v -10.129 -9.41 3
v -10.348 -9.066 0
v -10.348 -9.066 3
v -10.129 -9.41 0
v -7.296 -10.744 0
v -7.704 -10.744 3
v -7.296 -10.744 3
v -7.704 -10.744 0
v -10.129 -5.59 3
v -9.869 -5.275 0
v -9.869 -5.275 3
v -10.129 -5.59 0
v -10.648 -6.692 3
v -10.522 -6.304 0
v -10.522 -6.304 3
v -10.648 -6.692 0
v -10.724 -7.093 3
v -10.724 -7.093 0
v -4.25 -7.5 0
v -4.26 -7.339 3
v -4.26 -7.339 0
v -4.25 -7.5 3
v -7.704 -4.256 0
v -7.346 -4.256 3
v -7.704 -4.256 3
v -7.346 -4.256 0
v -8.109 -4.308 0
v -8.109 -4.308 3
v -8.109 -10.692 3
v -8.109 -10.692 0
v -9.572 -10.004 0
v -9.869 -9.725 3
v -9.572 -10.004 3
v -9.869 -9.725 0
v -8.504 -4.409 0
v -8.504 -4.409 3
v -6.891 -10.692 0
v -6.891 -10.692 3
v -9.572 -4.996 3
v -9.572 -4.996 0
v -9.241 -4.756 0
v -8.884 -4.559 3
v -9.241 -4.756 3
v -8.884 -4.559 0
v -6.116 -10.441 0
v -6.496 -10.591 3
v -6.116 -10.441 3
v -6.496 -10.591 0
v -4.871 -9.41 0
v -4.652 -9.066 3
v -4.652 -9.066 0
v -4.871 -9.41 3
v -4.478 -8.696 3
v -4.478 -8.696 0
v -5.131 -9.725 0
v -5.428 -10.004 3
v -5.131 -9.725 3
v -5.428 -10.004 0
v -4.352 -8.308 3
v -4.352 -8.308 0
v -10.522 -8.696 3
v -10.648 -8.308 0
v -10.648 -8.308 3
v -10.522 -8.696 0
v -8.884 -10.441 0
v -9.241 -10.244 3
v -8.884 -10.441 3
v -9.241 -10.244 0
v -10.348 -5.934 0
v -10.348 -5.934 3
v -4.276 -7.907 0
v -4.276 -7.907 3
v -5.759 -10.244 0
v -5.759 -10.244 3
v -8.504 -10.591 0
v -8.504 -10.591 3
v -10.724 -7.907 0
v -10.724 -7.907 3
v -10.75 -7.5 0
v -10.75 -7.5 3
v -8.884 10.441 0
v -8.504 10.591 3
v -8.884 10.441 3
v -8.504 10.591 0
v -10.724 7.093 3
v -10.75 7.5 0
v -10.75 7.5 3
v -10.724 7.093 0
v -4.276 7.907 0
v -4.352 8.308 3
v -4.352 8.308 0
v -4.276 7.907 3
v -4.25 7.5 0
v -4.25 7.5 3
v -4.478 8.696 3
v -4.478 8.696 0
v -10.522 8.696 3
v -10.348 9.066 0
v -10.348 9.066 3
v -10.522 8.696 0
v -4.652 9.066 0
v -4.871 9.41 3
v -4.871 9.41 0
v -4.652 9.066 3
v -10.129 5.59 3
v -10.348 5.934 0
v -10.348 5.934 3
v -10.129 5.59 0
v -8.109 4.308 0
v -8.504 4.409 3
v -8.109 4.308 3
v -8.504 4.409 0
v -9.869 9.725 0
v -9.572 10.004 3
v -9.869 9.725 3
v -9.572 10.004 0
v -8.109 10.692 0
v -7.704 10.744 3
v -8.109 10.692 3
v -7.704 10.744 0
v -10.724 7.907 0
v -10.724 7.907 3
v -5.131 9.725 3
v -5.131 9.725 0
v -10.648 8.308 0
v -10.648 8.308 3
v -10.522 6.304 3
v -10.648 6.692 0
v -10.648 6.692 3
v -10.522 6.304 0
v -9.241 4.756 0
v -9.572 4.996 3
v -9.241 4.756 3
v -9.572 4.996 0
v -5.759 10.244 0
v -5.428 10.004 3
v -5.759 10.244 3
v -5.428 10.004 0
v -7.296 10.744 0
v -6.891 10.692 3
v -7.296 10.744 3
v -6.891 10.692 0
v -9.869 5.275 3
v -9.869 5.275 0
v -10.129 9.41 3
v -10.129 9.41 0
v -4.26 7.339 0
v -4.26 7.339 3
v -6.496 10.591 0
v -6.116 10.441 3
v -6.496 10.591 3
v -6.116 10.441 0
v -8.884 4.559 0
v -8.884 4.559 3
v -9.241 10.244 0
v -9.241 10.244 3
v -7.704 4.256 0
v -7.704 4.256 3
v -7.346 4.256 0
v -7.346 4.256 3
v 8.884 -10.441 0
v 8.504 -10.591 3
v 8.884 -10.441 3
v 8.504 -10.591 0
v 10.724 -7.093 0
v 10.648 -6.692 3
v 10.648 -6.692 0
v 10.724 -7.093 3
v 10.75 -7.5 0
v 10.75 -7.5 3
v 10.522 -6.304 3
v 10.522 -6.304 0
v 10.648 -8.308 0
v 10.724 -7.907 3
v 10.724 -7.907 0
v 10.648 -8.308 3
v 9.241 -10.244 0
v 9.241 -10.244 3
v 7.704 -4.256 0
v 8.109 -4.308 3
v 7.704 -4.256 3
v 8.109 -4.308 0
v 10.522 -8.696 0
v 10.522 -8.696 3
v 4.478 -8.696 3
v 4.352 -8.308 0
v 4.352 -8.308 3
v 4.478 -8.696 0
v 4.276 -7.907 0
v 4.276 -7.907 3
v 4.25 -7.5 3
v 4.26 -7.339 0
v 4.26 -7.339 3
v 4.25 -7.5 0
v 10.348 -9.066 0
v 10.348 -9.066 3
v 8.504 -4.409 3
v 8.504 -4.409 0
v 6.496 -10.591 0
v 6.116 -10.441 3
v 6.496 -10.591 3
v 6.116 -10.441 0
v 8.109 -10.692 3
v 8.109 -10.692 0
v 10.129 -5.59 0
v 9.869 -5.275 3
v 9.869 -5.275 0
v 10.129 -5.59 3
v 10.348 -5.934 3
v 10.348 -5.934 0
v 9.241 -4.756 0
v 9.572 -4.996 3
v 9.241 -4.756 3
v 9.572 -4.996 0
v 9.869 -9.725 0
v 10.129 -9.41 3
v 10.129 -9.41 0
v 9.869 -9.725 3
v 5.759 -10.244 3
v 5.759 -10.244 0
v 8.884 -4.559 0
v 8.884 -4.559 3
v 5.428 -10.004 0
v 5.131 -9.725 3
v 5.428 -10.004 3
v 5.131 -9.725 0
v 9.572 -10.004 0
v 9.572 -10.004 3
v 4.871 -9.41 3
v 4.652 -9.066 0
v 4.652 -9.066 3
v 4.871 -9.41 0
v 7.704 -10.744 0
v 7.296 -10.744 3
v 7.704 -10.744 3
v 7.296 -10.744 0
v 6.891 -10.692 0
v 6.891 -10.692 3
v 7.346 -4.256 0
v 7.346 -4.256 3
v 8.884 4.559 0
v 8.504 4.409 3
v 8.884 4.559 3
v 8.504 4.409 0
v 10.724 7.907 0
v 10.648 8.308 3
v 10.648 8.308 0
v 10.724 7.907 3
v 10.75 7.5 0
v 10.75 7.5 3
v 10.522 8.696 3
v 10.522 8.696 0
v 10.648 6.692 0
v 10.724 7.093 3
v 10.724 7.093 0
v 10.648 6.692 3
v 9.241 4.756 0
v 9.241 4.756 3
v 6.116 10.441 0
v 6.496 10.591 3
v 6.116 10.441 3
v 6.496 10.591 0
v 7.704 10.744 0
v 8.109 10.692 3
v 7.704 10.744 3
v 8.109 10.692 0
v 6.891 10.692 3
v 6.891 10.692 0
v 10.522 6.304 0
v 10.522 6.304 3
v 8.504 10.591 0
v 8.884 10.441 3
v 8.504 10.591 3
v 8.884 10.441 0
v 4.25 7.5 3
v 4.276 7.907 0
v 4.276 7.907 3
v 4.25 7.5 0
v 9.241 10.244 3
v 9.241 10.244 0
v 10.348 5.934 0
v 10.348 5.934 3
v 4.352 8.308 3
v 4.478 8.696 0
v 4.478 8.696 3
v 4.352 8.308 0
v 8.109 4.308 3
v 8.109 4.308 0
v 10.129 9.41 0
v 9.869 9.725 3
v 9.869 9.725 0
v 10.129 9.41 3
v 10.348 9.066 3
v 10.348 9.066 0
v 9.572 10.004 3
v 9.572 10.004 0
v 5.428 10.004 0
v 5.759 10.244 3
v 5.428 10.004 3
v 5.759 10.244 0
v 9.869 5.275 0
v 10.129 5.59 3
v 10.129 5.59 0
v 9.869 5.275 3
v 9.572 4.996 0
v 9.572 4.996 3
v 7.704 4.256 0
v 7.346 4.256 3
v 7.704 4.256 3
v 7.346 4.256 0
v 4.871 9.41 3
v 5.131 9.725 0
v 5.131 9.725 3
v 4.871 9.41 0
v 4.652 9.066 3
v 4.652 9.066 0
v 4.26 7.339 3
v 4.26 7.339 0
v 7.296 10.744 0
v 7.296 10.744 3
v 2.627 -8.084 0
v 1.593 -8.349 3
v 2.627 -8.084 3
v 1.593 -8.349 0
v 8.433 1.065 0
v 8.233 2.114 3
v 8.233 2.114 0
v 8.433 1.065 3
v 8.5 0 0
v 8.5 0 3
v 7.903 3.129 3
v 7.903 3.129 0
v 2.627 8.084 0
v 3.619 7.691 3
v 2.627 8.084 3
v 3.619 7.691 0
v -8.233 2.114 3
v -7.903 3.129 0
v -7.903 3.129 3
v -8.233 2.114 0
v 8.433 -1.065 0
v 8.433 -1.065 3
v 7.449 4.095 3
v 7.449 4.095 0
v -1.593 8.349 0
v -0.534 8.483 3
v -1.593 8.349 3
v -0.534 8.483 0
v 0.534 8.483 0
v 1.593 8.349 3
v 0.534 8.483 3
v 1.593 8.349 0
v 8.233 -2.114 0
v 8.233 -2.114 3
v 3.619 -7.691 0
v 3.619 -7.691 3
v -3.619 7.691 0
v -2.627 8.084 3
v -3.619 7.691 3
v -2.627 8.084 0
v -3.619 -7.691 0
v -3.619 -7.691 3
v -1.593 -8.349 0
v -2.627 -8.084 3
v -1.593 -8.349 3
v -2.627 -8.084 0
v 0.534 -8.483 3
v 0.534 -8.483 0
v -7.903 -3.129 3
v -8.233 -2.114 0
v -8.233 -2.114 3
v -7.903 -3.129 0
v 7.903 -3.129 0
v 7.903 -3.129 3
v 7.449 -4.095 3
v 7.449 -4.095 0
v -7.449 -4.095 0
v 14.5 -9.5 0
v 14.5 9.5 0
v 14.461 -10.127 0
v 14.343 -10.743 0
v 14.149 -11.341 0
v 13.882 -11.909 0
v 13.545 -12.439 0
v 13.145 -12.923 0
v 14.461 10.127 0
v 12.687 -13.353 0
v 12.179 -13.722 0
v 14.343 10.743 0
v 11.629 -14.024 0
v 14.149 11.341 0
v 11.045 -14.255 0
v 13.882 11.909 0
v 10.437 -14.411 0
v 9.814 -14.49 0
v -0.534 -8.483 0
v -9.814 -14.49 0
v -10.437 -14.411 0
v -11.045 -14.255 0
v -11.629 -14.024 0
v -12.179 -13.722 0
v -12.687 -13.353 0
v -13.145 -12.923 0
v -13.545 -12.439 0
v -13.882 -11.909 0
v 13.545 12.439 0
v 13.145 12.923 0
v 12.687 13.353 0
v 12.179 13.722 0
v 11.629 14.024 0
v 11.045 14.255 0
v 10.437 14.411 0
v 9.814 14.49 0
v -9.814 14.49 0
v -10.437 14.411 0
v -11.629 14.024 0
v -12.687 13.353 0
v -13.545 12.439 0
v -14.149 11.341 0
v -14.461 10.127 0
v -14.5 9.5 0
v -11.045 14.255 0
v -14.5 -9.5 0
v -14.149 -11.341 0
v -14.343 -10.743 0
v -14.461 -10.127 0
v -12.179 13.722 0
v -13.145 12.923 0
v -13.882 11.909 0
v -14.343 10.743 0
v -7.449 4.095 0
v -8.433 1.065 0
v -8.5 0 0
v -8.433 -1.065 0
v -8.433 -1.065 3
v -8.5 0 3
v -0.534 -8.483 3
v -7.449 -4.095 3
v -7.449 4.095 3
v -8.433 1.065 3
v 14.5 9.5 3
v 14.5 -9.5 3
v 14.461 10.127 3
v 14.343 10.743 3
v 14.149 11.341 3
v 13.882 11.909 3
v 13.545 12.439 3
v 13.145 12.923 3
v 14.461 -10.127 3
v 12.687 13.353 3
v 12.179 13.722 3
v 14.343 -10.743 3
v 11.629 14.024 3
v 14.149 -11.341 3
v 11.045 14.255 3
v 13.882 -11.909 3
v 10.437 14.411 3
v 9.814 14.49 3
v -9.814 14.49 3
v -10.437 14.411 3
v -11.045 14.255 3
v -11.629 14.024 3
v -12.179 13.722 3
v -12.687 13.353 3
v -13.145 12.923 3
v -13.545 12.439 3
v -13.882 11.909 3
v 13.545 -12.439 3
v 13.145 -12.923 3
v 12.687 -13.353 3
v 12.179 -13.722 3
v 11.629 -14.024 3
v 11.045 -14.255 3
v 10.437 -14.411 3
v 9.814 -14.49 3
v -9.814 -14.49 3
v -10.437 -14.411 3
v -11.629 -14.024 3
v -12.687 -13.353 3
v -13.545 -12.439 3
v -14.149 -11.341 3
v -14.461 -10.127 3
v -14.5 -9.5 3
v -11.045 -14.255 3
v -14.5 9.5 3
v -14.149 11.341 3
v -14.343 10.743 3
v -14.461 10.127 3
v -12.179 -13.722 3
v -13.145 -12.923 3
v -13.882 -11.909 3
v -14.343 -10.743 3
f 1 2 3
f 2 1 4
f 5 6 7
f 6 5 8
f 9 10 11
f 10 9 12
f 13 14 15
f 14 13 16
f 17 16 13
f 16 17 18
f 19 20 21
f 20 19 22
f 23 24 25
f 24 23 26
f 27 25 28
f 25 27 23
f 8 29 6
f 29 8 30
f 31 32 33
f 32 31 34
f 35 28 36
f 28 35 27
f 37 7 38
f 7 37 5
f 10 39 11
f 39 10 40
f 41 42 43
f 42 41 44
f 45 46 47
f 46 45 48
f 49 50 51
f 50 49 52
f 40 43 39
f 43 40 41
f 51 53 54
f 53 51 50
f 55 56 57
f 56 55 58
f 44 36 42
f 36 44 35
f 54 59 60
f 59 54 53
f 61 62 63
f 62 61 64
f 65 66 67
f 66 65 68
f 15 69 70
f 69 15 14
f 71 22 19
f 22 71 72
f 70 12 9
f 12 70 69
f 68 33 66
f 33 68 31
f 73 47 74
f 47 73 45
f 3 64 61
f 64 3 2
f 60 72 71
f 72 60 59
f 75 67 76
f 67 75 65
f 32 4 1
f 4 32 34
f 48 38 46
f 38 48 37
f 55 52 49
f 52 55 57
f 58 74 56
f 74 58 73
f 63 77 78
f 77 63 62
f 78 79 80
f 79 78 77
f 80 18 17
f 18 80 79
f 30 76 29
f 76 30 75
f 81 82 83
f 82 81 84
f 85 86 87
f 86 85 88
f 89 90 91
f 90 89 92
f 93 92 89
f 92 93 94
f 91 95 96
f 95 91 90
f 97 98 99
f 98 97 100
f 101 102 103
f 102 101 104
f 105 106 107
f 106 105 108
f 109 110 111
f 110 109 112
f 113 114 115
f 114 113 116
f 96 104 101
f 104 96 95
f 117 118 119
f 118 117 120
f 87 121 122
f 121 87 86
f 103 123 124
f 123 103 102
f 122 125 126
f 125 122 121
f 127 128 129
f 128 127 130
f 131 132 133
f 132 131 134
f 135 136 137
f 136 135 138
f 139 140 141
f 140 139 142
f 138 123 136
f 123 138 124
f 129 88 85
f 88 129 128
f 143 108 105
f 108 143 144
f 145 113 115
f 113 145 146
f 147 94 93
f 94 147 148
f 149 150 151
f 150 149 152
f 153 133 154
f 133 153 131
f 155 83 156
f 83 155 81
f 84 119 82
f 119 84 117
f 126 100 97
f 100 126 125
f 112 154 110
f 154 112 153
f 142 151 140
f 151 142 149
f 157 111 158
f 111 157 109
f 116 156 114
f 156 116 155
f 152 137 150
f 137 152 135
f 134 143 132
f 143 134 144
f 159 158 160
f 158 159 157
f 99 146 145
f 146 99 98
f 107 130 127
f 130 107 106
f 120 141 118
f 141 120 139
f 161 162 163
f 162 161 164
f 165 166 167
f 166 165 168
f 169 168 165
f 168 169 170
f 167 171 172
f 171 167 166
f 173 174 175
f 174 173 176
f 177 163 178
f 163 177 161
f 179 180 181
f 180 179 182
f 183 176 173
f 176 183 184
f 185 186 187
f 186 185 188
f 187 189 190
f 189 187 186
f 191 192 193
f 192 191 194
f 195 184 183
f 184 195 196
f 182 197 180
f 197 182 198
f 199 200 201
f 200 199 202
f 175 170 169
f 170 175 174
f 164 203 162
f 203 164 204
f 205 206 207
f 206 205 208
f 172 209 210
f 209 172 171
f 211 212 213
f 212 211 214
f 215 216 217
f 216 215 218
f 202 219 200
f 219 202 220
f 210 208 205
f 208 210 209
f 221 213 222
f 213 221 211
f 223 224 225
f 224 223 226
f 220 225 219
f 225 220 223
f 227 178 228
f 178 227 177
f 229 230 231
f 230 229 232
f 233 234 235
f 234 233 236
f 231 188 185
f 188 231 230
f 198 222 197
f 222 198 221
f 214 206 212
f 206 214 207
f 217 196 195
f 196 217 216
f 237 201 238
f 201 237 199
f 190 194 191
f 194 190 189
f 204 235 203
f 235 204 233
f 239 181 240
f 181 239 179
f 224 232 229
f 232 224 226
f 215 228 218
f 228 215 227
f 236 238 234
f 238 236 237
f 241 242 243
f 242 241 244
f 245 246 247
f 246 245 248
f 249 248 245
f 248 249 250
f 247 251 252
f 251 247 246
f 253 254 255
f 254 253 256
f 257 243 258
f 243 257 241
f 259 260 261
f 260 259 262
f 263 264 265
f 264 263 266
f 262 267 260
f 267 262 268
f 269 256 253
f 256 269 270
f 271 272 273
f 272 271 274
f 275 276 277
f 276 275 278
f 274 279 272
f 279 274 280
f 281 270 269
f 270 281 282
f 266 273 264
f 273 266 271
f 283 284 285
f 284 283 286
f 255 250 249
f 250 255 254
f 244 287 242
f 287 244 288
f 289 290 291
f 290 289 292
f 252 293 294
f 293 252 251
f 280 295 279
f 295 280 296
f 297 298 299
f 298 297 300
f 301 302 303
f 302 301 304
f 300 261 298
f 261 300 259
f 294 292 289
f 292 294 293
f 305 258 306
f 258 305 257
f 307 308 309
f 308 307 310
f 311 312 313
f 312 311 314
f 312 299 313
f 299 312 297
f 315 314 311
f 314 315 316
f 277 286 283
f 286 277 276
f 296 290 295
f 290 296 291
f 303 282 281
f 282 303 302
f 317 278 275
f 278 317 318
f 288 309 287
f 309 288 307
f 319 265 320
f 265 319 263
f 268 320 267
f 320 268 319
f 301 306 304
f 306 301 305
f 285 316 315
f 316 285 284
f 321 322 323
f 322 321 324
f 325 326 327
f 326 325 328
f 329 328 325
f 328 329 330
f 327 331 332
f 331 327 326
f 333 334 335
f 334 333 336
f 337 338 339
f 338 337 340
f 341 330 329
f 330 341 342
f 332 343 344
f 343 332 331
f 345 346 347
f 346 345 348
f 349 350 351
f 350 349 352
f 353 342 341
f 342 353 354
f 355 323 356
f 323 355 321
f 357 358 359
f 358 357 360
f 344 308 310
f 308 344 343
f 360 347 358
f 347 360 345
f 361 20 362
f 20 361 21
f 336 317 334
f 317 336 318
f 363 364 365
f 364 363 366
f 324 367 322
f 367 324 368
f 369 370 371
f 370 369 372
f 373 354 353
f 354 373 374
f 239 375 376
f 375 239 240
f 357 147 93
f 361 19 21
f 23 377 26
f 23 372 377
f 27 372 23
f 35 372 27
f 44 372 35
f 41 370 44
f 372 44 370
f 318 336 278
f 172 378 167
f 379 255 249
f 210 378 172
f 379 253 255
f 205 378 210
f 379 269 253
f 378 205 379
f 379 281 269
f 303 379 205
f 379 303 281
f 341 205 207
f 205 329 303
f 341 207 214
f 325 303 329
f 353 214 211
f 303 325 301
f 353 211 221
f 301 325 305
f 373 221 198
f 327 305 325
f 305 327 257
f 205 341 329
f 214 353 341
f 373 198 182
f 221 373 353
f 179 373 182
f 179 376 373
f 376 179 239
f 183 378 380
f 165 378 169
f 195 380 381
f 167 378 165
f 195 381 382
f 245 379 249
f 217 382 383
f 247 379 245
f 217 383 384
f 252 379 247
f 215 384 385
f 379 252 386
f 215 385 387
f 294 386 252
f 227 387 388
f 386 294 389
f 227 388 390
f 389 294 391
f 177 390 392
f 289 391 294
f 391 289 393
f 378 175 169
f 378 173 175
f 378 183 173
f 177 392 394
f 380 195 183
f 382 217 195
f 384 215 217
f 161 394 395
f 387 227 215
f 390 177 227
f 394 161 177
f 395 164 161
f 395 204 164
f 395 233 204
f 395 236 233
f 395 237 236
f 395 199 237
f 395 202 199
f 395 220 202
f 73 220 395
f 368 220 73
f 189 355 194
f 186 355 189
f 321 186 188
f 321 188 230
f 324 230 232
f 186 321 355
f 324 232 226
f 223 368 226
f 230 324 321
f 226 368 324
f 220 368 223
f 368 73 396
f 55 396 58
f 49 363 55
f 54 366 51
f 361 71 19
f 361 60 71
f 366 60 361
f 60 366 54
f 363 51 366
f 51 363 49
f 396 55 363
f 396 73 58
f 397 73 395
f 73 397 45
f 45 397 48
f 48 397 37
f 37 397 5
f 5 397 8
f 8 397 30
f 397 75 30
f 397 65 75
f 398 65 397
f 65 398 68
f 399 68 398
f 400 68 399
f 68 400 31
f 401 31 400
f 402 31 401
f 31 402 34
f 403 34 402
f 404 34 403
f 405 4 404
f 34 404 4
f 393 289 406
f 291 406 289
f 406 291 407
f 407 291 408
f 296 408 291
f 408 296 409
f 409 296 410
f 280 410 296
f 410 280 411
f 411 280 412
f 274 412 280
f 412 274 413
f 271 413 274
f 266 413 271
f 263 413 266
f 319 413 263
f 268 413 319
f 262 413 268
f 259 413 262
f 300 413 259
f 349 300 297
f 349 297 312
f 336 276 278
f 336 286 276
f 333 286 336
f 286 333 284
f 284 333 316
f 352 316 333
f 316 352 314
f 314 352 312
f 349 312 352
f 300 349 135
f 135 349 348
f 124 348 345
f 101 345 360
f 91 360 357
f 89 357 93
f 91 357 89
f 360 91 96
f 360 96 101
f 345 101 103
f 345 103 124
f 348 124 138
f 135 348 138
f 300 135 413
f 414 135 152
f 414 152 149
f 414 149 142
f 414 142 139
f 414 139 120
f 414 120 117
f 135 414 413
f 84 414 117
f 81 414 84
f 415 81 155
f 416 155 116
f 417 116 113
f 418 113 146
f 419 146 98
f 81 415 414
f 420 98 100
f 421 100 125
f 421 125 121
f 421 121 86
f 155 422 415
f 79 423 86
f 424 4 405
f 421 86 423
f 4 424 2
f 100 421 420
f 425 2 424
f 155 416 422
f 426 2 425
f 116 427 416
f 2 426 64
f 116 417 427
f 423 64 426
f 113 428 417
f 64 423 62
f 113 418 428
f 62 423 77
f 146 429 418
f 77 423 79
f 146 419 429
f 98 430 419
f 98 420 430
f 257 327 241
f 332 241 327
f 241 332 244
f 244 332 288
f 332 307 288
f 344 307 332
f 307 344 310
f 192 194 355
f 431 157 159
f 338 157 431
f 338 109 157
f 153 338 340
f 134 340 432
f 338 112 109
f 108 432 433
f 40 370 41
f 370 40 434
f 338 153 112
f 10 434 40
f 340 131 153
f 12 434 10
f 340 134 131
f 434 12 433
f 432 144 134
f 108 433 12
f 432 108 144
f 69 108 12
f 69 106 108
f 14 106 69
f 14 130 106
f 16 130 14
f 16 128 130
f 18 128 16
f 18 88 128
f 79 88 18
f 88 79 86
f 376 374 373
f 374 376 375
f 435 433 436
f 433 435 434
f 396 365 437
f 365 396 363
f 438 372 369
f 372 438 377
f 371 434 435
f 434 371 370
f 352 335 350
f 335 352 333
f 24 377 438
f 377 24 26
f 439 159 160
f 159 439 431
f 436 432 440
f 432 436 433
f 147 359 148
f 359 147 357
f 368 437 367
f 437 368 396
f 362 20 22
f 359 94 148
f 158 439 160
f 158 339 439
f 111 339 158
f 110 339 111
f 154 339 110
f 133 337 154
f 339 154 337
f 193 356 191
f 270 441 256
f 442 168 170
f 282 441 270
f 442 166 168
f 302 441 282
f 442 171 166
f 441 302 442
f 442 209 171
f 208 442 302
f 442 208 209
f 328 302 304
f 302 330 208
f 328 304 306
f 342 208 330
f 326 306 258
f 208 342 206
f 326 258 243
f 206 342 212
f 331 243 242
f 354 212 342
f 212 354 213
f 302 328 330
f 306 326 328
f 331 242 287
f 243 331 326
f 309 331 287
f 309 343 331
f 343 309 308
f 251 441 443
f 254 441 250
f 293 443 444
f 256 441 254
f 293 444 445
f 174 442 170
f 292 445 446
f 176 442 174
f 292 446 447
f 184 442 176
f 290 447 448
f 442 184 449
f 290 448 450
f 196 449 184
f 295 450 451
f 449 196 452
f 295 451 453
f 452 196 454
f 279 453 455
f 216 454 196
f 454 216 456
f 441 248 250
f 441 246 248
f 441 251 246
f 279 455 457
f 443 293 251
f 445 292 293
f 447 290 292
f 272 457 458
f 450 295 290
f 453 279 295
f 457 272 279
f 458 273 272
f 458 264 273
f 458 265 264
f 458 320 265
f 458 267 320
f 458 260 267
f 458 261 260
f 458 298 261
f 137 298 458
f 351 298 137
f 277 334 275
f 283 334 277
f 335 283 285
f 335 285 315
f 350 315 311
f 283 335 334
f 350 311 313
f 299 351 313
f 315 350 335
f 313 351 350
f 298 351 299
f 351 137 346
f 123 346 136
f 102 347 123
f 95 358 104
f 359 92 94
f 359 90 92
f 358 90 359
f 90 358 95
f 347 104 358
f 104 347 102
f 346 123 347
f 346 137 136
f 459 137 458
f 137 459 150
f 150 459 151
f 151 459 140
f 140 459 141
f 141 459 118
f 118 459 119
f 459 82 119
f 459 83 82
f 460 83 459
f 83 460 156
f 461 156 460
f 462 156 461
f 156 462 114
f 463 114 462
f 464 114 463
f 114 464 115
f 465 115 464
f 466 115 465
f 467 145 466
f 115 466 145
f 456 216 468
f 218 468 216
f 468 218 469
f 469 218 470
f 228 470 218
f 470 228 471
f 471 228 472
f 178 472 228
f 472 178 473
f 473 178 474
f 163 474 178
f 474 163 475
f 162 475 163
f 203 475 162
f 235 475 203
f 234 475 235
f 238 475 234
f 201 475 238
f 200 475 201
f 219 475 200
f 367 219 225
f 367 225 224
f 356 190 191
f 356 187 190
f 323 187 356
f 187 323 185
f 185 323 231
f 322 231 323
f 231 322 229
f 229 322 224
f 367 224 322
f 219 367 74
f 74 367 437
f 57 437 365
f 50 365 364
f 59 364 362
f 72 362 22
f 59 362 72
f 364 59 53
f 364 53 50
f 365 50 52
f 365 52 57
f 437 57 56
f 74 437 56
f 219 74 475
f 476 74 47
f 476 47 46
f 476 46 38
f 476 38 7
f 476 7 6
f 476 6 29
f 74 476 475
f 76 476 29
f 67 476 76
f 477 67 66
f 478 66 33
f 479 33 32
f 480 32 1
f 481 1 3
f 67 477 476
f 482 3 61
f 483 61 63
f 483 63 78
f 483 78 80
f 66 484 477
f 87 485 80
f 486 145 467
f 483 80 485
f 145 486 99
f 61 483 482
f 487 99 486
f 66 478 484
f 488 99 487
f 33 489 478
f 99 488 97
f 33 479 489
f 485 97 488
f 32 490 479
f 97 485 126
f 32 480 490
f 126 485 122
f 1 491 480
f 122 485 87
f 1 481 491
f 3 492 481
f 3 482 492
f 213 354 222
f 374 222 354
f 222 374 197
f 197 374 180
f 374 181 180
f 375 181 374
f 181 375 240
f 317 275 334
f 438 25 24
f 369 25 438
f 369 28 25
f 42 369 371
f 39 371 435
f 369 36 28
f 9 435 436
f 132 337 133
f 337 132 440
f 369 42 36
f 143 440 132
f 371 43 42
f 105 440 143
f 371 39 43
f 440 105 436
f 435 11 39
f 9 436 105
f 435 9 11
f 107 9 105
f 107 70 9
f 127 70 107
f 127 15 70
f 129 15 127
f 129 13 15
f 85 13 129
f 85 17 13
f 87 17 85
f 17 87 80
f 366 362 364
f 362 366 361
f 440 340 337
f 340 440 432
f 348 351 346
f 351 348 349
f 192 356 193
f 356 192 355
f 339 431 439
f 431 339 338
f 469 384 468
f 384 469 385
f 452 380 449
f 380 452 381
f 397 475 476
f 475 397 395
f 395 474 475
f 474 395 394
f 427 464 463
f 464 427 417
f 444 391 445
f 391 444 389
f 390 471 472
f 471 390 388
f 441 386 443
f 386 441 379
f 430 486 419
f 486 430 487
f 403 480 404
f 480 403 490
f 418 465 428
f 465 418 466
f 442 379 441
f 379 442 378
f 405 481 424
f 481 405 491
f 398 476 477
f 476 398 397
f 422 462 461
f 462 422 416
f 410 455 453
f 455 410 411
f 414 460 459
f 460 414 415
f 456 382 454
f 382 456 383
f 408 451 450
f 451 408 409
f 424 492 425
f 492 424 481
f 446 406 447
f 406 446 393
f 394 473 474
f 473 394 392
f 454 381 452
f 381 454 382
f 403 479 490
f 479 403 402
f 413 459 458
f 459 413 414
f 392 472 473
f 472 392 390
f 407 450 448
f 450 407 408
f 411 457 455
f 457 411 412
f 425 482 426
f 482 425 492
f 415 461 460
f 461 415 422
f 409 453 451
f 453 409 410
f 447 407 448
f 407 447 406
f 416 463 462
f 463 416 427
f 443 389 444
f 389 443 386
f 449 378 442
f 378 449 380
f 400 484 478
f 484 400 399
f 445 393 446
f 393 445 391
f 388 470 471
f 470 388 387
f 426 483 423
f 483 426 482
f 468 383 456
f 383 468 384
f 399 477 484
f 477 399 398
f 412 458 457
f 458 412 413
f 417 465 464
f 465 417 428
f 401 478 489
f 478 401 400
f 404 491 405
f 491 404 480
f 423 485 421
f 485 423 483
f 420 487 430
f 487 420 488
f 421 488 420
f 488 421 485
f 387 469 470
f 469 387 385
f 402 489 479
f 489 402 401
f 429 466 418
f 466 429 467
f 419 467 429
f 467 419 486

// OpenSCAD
$fn = 50;


difference() {
	union() {
		hull() {
			translate(v = [-9.5000000000, 9.5000000000, 0]) {
				cylinder(h = 3, r = 5);
			}
			translate(v = [9.5000000000, 9.5000000000, 0]) {
				cylinder(h = 3, r = 5);
			}
			translate(v = [-9.5000000000, -9.5000000000, 0]) {
				cylinder(h = 3, r = 5);
			}
			translate(v = [9.5000000000, -9.5000000000, 0]) {
				cylinder(h = 3, r = 5);
			}
		}
	}
	union() {
		#translate(v = [-7.5000000000, -7.5000000000, -100.0000000000]) {
			cylinder(h = 200, r = 3.2500000000);
		}
		#translate(v = [-7.5000000000, 7.5000000000, -100.0000000000]) {
			cylinder(h = 200, r = 3.2500000000);
		}
		#translate(v = [7.5000000000, -7.5000000000, -100.0000000000]) {
			cylinder(h = 200, r = 3.2500000000);
		}
		#translate(v = [7.5000000000, 7.5000000000, -100.0000000000]) {
			cylinder(h = 200, r = 3.2500000000);
		}
		#cylinder(h = 3, r = 8.5000000000);
	}
}
